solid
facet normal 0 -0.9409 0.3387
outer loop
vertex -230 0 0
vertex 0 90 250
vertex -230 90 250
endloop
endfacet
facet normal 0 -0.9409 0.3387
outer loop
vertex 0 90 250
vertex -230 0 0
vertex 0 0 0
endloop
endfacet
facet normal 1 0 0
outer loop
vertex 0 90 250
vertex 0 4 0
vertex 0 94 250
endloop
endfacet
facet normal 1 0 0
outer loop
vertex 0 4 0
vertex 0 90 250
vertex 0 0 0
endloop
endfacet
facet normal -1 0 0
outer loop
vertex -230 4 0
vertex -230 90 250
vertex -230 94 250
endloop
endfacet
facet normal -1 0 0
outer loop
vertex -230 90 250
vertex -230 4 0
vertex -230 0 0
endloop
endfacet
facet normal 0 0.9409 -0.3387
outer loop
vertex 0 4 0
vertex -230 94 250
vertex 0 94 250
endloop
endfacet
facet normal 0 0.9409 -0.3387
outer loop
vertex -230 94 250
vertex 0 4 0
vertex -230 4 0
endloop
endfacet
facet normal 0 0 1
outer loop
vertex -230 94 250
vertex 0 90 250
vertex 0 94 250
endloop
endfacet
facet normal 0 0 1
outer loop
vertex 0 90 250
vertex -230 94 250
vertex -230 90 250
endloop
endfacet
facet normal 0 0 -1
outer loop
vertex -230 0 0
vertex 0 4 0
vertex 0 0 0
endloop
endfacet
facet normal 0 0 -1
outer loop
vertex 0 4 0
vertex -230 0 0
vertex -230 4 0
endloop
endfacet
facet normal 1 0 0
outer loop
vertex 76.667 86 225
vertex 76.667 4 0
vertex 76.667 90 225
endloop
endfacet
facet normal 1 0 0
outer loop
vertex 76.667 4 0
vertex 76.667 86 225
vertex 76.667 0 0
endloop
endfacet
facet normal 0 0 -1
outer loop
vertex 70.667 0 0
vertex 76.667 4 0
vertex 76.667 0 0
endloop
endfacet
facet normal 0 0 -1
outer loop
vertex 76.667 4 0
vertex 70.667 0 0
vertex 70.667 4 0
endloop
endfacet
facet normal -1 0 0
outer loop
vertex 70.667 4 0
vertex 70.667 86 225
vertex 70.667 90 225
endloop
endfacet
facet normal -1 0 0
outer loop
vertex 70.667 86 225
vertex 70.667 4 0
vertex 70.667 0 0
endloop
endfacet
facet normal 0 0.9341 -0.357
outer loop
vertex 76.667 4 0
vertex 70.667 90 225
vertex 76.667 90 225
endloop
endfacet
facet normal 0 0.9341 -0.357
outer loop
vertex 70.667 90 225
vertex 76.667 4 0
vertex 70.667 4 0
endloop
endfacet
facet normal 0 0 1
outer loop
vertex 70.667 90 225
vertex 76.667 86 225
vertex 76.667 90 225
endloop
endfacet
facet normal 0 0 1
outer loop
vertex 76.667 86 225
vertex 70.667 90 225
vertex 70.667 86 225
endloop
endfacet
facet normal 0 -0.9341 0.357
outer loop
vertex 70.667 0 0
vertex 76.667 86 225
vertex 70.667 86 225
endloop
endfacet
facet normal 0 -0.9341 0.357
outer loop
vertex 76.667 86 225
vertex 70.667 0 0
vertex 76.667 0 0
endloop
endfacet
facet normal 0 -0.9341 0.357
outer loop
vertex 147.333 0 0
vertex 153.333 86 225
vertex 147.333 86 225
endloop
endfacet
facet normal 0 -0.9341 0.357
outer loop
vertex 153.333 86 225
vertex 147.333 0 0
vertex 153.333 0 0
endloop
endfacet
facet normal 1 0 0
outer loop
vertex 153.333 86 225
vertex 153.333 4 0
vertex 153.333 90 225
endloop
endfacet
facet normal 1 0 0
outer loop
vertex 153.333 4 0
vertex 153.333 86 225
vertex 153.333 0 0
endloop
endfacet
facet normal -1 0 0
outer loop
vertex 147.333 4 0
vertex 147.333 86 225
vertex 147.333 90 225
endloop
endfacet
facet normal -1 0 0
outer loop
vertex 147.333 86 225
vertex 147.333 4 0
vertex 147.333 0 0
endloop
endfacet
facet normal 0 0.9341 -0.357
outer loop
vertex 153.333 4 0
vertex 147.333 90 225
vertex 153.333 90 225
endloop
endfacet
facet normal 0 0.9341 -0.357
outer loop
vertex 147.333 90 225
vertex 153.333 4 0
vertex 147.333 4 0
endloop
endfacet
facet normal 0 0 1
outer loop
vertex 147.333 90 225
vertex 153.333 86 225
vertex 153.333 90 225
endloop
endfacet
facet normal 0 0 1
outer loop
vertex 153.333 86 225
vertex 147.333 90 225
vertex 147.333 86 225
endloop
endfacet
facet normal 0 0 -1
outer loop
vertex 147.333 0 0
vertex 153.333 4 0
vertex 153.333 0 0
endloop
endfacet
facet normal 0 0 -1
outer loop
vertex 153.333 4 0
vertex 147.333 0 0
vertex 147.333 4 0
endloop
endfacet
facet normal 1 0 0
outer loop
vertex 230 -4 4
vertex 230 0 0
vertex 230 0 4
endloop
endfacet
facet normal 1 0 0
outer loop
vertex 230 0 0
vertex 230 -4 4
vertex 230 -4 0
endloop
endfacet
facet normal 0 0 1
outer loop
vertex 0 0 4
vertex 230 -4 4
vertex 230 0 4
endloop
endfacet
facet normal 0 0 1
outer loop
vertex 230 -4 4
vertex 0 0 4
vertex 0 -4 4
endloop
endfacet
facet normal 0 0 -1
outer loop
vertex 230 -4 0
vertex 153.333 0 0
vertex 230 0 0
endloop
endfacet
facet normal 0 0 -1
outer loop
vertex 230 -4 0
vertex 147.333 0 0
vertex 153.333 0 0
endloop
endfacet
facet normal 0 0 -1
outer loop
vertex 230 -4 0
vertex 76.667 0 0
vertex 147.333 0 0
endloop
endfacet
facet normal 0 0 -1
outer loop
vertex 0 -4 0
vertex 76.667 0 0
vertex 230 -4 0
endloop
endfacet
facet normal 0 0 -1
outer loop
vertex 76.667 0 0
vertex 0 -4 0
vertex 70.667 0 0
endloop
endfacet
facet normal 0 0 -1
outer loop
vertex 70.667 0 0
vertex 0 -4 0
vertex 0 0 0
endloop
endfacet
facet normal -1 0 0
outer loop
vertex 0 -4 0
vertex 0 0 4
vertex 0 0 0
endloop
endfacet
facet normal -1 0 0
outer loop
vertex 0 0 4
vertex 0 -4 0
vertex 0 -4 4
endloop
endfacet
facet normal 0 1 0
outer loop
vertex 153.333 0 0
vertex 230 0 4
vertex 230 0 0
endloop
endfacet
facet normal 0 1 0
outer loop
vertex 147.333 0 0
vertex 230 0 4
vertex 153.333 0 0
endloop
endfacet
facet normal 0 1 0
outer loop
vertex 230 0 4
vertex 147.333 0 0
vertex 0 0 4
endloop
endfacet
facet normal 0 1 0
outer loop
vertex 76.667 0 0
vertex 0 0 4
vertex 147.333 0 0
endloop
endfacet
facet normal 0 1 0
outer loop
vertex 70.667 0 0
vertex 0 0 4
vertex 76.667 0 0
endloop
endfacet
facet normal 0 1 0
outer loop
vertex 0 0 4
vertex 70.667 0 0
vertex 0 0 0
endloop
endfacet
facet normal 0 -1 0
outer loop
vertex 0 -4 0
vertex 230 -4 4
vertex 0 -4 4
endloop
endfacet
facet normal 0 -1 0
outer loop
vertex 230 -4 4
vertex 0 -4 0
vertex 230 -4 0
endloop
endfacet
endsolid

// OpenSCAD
base_width = 230;
base_depth = 250;
rise_height = 90;
panel_thickness = 4;
vent_count = 6;
rib_thickness = 6;

module deck_profile() {
    polygon([
        [0, 0],
        [0, panel_thickness],
        [base_depth, rise_height + panel_thickness],
        [base_depth, rise_height]
    ]);
}

module deck_solid() {
    rotate([0, -90, 0])
        linear_extrude(height = base_width, center = false)
            deck_profile();
}

module vents() {
    spacing = base_width / (vent_count + 1);
    for (i = [1 : vent_count]) {
        translate([
            i * spacing,
            base_depth * 0.25,
            rise_height * 0.5
        ])
            rotate([0, 0, 0])
                cube([
                    rib_thickness * 1.5,
                    base_depth * 0.5,
                    panel_thickness * 2
                ], center = true);
    }
}

module ribs() {
    spacing = base_width / 3;
    for (x_pos = [spacing, base_width - spacing]) {
        translate([x_pos, 0, 0])
            rotate([0, -90, 0])
                linear_extrude(height = rib_thickness, center = false)
                    polygon([
                        [0, 0],
                        [0, panel_thickness],
                        [base_depth * 0.9, rise_height],
                        [base_depth * 0.9, rise_height - panel_thickness]
                    ]);
    }
}

module main() {
    difference() {
        deck_solid();
        vents();
    }
    ribs();
    translate([0, -panel_thickness, 0])
        cube([base_width, panel_thickness, panel_thickness], center = false);
}

main();
